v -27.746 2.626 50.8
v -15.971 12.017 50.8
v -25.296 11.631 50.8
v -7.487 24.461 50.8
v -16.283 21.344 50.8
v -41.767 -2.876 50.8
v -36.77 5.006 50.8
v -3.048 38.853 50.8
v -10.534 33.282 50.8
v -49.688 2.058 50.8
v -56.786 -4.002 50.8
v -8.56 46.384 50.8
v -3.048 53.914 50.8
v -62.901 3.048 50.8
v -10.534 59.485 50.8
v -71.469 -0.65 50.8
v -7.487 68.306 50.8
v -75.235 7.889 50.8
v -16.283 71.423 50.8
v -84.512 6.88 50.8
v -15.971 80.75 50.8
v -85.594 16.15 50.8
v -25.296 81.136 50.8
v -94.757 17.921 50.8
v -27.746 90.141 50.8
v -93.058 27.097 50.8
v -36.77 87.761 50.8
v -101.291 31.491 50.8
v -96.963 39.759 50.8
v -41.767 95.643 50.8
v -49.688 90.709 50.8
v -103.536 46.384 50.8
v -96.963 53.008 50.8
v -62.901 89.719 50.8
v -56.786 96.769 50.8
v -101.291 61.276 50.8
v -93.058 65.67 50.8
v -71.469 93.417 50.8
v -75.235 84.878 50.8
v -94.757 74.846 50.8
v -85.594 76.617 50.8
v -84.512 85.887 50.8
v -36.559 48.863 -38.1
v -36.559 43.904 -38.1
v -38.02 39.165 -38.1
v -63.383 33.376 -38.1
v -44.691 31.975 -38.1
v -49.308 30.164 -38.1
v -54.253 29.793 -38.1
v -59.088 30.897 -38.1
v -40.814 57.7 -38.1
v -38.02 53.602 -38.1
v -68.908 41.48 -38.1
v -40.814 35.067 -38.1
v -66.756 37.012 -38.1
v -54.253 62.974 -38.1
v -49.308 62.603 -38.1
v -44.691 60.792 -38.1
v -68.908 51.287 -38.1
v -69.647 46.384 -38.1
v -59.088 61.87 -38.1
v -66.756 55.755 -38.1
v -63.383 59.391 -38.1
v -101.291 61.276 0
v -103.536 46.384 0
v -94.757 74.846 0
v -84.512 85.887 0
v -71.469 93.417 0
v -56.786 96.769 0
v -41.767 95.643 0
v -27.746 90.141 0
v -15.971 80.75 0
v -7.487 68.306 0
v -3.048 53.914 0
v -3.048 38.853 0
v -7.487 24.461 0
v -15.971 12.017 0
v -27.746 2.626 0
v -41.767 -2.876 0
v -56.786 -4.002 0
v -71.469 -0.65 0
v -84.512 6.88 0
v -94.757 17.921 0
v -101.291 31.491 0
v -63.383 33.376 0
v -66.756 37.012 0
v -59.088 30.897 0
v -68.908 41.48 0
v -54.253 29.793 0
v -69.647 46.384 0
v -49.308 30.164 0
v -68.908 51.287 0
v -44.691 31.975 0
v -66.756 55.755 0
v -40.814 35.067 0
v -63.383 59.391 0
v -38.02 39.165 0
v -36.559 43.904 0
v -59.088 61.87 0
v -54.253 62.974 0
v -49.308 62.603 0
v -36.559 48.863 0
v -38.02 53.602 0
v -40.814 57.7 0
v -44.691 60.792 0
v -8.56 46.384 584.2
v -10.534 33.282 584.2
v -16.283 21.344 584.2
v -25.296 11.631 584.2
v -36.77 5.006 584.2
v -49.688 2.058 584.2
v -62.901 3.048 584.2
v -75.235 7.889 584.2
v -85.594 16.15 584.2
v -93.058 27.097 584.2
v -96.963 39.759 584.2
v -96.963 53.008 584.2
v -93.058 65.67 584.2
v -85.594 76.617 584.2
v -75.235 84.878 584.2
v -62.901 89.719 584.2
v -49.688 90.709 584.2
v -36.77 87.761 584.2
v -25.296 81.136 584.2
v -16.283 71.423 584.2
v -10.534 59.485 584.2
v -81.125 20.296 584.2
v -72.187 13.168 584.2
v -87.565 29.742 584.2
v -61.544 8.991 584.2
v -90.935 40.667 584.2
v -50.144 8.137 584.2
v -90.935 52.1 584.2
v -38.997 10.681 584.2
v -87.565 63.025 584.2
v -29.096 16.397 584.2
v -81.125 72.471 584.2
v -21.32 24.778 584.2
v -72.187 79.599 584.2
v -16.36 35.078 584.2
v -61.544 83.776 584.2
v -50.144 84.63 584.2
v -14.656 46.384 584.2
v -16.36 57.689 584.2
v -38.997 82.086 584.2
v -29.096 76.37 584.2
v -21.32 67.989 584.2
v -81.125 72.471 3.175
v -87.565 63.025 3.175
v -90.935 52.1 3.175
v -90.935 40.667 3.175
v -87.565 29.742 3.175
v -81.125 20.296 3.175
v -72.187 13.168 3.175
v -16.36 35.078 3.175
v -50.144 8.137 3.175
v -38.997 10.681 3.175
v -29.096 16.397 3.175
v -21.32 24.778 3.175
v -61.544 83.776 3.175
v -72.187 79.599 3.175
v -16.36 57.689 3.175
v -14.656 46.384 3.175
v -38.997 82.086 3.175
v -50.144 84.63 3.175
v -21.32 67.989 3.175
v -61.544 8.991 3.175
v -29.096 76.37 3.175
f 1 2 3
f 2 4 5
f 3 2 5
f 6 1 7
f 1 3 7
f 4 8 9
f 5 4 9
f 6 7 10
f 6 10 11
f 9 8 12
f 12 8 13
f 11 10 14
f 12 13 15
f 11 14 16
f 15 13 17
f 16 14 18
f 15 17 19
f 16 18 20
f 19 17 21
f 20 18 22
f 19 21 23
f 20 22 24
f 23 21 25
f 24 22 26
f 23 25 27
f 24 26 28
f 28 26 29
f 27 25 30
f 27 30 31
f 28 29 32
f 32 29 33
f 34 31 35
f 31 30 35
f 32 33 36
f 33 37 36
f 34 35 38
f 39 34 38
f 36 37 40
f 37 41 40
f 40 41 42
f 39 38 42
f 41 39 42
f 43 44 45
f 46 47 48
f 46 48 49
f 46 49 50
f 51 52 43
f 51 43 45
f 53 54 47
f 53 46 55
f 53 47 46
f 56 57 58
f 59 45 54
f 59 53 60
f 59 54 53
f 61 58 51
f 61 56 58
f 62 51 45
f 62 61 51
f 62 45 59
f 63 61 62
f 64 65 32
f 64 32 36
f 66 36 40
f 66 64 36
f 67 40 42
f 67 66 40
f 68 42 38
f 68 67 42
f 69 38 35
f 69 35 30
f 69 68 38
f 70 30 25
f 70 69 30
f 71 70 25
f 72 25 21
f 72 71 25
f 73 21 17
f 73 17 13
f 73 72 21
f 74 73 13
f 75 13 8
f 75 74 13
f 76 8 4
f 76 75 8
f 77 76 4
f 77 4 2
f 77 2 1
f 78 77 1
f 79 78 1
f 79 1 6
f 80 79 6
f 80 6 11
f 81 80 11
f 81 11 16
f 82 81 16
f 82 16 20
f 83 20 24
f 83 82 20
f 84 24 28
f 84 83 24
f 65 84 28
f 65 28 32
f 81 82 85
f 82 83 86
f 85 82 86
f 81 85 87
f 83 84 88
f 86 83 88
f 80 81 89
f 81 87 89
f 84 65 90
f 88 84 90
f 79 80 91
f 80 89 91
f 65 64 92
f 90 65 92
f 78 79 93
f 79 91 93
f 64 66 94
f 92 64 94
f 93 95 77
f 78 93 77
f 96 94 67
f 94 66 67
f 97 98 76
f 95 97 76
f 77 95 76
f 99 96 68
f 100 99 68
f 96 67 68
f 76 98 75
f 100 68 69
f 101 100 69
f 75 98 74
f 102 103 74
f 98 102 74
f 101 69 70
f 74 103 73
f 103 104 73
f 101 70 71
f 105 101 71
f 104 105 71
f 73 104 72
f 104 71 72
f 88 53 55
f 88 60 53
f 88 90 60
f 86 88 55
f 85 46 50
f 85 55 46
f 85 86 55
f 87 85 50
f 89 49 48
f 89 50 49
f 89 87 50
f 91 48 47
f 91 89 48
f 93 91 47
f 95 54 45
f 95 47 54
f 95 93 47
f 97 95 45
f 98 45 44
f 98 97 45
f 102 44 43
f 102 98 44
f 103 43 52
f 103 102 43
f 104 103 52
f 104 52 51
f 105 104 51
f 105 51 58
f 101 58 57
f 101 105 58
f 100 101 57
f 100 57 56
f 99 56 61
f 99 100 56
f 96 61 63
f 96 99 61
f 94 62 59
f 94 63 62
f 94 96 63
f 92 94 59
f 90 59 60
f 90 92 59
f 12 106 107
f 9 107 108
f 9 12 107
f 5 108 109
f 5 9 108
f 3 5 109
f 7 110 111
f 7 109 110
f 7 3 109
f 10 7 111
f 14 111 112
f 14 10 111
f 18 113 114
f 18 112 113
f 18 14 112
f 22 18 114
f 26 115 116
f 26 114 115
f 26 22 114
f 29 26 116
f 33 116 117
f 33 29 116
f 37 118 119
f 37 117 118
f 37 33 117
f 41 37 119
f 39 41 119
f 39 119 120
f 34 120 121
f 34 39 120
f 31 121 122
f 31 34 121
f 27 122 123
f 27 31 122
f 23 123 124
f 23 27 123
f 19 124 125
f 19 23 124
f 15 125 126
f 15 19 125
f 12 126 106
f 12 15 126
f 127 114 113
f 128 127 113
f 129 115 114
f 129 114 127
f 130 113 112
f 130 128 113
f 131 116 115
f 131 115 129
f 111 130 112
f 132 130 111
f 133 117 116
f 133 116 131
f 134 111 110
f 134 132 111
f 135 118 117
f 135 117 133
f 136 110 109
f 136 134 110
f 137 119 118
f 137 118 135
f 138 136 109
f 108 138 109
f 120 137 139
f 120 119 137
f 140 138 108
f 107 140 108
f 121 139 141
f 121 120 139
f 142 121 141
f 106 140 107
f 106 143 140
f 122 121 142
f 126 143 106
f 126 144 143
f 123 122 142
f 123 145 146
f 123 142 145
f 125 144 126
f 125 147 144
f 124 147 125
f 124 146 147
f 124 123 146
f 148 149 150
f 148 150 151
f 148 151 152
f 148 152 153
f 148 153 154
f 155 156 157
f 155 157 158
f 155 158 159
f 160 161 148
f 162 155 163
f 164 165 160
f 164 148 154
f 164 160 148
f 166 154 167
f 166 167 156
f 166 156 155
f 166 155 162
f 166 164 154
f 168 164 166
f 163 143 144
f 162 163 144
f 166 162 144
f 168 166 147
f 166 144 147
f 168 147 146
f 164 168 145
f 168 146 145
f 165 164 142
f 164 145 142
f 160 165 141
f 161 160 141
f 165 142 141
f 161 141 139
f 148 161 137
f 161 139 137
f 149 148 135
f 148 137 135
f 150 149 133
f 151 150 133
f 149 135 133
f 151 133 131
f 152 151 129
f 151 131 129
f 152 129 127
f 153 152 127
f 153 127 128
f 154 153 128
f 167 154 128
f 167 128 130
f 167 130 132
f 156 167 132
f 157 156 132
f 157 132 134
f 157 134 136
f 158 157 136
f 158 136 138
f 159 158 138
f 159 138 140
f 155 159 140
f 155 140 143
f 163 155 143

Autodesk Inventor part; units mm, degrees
ref_plane "YZ Plane" through (0, 0, 0) normal (1, 0, 0) x (0, 1, 0)
ref_plane "XZ Plane" through (0, 0, 0) normal (0, 1, 0) x (-1, 0, 0)
ref_plane "XY Plane" through (0, 0, 0) normal (0, 0, 1) x (1, 0, 0)
sketch "Sketch1" plane through (0, 0, 0) normal (0, 0, 1) x (1, 0, 0)
  circle A0 centre (-53.0097, 46.3835) radius 44.45
  point P0 (0, 0)
  dimension "d0" = 88.9
extrude "Extrusion1" add sketch "Sketch1" along normal blind 584.2
sketch "Sketch2" plane through (-53.0097, 46.3835, 0) normal (0, 0, -1) x (-1, 0, 0)
  circle A0 centre (0, 0) radius 44.45 projected
  circle A1 centre (0, 0) radius 50.5264
  point P0 (-53.0097, -46.3835)
  dimension "d3" = 6.0764
extrude "Extrusion2" add sketch "Sketch2" against normal blind 50.8 contours A0 | A1
sketch "Sketch3" plane through (-53.0097, 46.3835, 584.2) normal (0, 0, 1) x (1, 0, 0)
  circle A0 centre (0, 0) radius 44.45 projected
  circle A1 centre (0, 0) radius 38.354
  point P0 (53.0097, -46.3835)
  dimension "d6" = 6.096
extrude "Extrusion3" cut sketch "Sketch3" against normal blind 581.025 contours A1
sketch "Sketch4" plane through (-53.0097, 46.3835, 0) normal (0, 0, -1) x (-1, 0, 0)
  circle A0 centre (0, 0) radius 16.637
  point P0 (-53.0097, -46.3835)
  dimension "d9" = 33.274
extrude "Extrusion4" add sketch "Sketch4" along normal blind 38.1
thread "Thread1" size "1 5/16-8 UN" class "2A" standard "ANSI Unified Screw Threads" full length
properties part number "long pipe"
